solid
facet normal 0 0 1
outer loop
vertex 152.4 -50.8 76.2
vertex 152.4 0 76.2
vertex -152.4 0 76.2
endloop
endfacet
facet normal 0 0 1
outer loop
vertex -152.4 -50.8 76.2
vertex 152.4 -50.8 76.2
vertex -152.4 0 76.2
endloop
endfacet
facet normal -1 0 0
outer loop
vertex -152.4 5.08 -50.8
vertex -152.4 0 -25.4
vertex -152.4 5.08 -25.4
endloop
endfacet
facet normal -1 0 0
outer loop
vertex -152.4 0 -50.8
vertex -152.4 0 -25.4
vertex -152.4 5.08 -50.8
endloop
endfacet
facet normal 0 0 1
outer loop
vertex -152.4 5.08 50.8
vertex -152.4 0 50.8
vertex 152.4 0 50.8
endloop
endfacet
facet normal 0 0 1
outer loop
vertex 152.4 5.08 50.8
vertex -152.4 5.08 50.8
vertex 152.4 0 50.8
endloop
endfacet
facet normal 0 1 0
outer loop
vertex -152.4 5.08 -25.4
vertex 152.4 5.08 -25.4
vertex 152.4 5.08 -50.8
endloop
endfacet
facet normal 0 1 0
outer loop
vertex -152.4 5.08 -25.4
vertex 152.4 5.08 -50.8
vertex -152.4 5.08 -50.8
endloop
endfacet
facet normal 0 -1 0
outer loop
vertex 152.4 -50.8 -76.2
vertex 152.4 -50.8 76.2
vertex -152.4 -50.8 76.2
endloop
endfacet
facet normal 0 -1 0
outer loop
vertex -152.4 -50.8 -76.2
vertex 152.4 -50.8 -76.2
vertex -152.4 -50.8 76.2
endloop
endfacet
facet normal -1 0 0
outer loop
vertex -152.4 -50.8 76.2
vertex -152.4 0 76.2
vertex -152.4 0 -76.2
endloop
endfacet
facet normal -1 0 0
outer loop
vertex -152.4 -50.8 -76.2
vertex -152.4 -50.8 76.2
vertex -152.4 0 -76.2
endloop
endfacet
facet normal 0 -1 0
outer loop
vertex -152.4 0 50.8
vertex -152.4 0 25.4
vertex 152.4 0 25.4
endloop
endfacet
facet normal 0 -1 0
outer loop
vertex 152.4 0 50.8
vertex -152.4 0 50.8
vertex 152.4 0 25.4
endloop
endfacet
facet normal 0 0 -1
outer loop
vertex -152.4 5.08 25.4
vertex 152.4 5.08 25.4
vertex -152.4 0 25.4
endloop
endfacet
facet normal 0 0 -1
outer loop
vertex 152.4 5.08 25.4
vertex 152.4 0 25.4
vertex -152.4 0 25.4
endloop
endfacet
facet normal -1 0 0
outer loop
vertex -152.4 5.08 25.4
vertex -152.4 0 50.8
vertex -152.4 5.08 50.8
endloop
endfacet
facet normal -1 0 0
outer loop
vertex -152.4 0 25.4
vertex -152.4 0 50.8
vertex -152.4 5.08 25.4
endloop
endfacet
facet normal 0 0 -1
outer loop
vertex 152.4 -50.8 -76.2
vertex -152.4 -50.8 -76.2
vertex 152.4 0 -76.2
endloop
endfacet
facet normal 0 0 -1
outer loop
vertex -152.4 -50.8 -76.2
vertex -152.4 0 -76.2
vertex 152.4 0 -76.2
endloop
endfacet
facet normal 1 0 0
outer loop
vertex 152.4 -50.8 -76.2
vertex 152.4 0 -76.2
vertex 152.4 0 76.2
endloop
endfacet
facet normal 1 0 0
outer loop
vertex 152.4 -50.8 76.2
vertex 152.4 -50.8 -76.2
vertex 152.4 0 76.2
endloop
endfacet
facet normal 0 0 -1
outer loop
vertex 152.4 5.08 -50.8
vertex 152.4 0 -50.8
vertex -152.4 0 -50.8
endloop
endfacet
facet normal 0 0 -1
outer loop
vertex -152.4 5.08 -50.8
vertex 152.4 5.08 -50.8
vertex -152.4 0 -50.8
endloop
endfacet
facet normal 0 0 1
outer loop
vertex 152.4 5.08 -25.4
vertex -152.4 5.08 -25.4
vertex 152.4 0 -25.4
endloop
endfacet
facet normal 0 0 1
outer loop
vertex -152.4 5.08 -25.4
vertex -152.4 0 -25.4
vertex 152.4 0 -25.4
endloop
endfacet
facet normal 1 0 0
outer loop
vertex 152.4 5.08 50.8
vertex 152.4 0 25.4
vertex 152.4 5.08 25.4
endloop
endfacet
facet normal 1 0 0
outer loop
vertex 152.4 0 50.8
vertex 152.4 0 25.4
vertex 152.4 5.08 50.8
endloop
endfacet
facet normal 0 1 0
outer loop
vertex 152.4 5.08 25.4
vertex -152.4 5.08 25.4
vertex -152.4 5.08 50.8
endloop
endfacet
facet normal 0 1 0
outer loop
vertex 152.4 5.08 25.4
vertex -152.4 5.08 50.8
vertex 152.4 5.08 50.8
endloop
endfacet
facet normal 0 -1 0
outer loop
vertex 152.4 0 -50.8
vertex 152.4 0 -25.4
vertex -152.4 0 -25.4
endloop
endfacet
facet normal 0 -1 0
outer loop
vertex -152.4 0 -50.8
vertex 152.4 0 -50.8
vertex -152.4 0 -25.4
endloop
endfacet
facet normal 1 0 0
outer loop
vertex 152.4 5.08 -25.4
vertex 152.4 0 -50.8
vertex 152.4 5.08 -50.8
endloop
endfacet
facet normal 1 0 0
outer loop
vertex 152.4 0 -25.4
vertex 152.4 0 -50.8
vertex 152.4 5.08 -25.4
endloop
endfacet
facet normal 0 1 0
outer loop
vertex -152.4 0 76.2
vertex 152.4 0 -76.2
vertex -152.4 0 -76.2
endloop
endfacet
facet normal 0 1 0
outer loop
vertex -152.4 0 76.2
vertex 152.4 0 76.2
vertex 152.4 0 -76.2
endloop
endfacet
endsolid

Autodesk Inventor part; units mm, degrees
ref_plane "YZ Plane" through (0, 0, 0) normal (1, 0, 0) x (0, 1, 0)
ref_plane "XZ Plane" through (0, 0, 0) normal (0, 1, 0) x (-1, 0, 0)
sketch "Substrate and Ribbon" plane through (0, 0, 0) normal (0, 1, 0) x (-1, 0, 0)
  line L0 (-152.4, 76.2) -> (152.4, 76.2)
  line L1 (152.4, 76.2) -> (152.4, -76.2)
  line L2 (152.4, -76.2) -> (-152.4, -76.2)
  line L3 (-152.4, -76.2) -> (-152.4, 76.2)
  line L4 (-152.4, 76.2) -> (152.4, -76.2) construction
  line L5 (152.4, 76.2) -> (-152.4, -76.2) construction
  line L6 (152.4, -25.4) -> (-152.4, -25.4)
  line L7 (-152.4, -25.4) -> (-152.4, -50.8)
  line L8 (-152.4, -50.8) -> (152.4, -50.8)
  line L9 (152.4, -50.8) -> (152.4, -25.4)
  line L10 (152.4, 0) -> (-152.4, 0) construction
  point P0 (0, 0)
  dimension "d0" = 304.8
  dimension "d1" = 152.4
  dimension "d2" = 25.4
  dimension "d10" = 25.4
extrude "Graphene Ribbon" add sketch "Substrate and Ribbon" along normal blind 5.08 contours L6 L1 L8 L3
extrude "Substrate" add sketch "Substrate and Ribbon" against normal blind 50.8 separate body
ref_plane "Mirror Plane" through (-152.4, 0, 0) normal (0, 0, -1) x (1, 0, 0)
mirror "Coupled Ribbon" about plane through (-152.4, 0, 0) normal (0, 0, -1) of "Graphene Ribbon" bodies 1
properties part number "Coupler-3D"
